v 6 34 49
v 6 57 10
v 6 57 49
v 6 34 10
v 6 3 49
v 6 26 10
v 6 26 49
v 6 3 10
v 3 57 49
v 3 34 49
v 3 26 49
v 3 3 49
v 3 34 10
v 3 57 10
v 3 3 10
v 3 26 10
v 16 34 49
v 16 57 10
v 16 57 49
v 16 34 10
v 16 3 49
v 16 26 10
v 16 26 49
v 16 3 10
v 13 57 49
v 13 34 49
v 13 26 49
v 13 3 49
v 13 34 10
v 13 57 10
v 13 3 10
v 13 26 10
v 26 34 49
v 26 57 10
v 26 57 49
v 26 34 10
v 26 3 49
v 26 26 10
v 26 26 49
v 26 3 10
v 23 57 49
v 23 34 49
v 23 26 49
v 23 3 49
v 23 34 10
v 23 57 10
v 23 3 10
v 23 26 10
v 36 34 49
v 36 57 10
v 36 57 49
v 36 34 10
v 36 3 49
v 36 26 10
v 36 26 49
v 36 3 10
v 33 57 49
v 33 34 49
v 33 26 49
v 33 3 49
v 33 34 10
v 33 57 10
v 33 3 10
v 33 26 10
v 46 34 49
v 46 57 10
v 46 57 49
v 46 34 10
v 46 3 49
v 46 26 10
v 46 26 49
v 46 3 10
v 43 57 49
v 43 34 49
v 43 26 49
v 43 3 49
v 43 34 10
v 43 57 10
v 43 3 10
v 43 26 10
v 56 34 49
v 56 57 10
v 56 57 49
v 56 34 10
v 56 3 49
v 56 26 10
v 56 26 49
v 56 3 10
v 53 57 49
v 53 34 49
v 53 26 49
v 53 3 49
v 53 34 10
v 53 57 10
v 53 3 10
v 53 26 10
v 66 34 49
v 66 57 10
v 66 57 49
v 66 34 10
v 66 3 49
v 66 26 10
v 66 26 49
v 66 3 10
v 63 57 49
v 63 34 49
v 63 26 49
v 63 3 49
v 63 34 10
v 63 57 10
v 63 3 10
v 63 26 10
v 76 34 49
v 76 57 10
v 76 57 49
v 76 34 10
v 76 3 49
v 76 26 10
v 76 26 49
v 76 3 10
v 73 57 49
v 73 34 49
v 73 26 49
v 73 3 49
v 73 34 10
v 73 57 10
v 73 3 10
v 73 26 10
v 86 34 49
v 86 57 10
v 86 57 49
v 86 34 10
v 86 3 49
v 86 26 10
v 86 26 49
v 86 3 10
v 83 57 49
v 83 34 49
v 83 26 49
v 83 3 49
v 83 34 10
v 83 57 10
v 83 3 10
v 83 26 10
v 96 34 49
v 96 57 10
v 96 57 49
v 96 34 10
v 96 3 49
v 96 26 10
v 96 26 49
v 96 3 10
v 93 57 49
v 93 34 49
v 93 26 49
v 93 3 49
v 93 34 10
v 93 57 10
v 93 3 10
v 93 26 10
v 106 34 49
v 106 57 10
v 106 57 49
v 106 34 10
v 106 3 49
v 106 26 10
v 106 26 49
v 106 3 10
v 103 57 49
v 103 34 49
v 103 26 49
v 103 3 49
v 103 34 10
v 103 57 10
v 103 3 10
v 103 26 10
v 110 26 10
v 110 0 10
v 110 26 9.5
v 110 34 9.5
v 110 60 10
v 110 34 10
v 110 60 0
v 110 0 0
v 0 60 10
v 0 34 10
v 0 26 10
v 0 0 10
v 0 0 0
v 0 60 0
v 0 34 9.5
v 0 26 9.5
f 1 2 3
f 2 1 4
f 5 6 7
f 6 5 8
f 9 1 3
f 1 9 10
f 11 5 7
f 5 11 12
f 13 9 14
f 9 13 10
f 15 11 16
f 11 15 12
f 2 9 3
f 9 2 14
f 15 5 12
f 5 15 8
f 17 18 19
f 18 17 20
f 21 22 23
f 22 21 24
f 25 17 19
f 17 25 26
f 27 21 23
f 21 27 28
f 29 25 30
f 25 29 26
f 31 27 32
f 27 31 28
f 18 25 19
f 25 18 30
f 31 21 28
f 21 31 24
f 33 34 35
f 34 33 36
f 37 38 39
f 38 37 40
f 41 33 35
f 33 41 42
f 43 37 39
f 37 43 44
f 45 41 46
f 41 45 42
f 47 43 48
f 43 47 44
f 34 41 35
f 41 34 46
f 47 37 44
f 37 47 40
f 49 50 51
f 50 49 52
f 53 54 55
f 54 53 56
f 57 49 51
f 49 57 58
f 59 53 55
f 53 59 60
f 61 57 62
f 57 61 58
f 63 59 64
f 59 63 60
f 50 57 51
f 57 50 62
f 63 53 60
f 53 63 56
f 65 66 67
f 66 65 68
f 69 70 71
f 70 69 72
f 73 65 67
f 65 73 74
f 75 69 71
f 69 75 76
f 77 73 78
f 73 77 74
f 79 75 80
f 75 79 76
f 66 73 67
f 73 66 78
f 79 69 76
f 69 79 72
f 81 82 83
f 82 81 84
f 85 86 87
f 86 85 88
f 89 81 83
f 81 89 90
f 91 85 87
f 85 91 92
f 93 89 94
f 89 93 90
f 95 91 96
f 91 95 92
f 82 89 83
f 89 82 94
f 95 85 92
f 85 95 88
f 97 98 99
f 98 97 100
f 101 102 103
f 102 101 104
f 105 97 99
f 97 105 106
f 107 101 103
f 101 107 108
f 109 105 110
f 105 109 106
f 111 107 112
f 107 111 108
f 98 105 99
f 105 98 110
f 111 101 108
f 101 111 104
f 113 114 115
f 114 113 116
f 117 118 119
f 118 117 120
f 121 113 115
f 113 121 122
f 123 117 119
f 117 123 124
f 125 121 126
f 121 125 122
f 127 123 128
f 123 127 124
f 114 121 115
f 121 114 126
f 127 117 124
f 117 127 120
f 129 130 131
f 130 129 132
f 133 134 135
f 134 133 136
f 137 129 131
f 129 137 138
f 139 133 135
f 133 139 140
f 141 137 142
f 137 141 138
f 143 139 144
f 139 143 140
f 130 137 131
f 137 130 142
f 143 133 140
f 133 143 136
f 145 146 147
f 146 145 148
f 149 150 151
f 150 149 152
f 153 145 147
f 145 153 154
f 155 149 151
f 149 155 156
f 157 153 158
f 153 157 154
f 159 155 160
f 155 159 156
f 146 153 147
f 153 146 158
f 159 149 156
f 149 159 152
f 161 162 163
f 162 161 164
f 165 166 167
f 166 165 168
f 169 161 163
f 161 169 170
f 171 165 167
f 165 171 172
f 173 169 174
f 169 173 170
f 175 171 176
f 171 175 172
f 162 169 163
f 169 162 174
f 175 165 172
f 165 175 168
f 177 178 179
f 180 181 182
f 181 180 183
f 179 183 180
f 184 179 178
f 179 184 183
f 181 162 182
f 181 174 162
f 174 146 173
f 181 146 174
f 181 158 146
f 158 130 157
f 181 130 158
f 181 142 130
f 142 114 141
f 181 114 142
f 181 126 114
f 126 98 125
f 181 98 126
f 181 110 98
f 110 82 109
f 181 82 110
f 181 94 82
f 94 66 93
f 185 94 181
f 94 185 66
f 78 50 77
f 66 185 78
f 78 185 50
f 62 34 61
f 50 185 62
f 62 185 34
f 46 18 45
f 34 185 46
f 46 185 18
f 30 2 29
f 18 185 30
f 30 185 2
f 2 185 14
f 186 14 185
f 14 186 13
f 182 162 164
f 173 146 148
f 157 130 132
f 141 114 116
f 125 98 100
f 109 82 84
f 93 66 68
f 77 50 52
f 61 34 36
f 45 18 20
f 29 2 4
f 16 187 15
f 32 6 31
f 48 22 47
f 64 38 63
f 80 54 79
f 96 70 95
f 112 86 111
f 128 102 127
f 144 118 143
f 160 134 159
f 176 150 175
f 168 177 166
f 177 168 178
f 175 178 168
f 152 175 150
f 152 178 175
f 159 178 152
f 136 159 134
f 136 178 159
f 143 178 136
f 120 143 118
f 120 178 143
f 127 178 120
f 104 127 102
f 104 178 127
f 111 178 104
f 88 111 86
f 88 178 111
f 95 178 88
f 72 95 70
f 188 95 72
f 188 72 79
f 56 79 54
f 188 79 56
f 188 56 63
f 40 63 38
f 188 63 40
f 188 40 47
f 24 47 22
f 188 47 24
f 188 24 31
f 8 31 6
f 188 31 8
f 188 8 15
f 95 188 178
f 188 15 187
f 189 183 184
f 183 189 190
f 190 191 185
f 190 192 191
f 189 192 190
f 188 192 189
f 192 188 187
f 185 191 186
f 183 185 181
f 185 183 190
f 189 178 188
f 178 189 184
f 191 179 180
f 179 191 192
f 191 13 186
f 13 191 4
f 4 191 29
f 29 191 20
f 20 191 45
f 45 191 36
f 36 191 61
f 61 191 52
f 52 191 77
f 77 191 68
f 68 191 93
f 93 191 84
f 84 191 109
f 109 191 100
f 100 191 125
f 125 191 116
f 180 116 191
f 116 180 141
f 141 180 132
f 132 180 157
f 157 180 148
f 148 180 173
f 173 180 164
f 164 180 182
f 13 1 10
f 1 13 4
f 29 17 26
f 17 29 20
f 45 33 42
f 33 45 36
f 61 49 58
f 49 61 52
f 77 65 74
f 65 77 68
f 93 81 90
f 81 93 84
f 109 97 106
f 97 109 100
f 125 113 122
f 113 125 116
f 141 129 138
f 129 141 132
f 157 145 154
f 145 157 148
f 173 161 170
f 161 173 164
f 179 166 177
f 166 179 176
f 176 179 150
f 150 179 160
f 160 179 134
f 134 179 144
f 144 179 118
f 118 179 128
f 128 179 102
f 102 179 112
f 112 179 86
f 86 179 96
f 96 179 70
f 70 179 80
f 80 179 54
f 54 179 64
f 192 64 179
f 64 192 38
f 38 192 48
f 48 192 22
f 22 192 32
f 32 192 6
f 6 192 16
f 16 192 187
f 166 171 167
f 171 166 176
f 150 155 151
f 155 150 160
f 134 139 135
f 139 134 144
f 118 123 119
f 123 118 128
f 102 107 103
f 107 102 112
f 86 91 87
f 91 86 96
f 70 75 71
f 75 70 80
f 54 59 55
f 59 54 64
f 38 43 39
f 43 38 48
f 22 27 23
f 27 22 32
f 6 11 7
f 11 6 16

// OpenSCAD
$fn = 32;

// ----------------------------------------------------------------------
// Heatsink: slotted fin block
// ----------------------------------------------------------------------

// --- parameters (mm) ---
base_l = 110;             // base length, X
base_w = 60;              // base width, Y
base_t = 10;              // base plate thickness
fin_h = 40;               // fin height above the base
fin_t = 3;                // fin thickness
edge = 3;                 // margin from the base ends
pitch = 10;               // fin pitch
slot_w = 8;               // central slot width, Y

n_fins = floor((base_l - 2 * edge - fin_t) / pitch) + 1;  // fin count
total_h = base_t + fin_h - 1;  // overall height

difference() {
union() {
  cube([base_l, base_w, base_t]);
  for (i = [0 : n_fins - 1])
    translate([edge + i * pitch, edge, base_t - 1])
      cube([fin_t, base_w - 2 * edge, fin_h]);
}
  translate([-1, base_w / 2 - slot_w / 2, base_t - 0.5])
    cube([base_l + 2, slot_w, fin_h + 2]);
}
